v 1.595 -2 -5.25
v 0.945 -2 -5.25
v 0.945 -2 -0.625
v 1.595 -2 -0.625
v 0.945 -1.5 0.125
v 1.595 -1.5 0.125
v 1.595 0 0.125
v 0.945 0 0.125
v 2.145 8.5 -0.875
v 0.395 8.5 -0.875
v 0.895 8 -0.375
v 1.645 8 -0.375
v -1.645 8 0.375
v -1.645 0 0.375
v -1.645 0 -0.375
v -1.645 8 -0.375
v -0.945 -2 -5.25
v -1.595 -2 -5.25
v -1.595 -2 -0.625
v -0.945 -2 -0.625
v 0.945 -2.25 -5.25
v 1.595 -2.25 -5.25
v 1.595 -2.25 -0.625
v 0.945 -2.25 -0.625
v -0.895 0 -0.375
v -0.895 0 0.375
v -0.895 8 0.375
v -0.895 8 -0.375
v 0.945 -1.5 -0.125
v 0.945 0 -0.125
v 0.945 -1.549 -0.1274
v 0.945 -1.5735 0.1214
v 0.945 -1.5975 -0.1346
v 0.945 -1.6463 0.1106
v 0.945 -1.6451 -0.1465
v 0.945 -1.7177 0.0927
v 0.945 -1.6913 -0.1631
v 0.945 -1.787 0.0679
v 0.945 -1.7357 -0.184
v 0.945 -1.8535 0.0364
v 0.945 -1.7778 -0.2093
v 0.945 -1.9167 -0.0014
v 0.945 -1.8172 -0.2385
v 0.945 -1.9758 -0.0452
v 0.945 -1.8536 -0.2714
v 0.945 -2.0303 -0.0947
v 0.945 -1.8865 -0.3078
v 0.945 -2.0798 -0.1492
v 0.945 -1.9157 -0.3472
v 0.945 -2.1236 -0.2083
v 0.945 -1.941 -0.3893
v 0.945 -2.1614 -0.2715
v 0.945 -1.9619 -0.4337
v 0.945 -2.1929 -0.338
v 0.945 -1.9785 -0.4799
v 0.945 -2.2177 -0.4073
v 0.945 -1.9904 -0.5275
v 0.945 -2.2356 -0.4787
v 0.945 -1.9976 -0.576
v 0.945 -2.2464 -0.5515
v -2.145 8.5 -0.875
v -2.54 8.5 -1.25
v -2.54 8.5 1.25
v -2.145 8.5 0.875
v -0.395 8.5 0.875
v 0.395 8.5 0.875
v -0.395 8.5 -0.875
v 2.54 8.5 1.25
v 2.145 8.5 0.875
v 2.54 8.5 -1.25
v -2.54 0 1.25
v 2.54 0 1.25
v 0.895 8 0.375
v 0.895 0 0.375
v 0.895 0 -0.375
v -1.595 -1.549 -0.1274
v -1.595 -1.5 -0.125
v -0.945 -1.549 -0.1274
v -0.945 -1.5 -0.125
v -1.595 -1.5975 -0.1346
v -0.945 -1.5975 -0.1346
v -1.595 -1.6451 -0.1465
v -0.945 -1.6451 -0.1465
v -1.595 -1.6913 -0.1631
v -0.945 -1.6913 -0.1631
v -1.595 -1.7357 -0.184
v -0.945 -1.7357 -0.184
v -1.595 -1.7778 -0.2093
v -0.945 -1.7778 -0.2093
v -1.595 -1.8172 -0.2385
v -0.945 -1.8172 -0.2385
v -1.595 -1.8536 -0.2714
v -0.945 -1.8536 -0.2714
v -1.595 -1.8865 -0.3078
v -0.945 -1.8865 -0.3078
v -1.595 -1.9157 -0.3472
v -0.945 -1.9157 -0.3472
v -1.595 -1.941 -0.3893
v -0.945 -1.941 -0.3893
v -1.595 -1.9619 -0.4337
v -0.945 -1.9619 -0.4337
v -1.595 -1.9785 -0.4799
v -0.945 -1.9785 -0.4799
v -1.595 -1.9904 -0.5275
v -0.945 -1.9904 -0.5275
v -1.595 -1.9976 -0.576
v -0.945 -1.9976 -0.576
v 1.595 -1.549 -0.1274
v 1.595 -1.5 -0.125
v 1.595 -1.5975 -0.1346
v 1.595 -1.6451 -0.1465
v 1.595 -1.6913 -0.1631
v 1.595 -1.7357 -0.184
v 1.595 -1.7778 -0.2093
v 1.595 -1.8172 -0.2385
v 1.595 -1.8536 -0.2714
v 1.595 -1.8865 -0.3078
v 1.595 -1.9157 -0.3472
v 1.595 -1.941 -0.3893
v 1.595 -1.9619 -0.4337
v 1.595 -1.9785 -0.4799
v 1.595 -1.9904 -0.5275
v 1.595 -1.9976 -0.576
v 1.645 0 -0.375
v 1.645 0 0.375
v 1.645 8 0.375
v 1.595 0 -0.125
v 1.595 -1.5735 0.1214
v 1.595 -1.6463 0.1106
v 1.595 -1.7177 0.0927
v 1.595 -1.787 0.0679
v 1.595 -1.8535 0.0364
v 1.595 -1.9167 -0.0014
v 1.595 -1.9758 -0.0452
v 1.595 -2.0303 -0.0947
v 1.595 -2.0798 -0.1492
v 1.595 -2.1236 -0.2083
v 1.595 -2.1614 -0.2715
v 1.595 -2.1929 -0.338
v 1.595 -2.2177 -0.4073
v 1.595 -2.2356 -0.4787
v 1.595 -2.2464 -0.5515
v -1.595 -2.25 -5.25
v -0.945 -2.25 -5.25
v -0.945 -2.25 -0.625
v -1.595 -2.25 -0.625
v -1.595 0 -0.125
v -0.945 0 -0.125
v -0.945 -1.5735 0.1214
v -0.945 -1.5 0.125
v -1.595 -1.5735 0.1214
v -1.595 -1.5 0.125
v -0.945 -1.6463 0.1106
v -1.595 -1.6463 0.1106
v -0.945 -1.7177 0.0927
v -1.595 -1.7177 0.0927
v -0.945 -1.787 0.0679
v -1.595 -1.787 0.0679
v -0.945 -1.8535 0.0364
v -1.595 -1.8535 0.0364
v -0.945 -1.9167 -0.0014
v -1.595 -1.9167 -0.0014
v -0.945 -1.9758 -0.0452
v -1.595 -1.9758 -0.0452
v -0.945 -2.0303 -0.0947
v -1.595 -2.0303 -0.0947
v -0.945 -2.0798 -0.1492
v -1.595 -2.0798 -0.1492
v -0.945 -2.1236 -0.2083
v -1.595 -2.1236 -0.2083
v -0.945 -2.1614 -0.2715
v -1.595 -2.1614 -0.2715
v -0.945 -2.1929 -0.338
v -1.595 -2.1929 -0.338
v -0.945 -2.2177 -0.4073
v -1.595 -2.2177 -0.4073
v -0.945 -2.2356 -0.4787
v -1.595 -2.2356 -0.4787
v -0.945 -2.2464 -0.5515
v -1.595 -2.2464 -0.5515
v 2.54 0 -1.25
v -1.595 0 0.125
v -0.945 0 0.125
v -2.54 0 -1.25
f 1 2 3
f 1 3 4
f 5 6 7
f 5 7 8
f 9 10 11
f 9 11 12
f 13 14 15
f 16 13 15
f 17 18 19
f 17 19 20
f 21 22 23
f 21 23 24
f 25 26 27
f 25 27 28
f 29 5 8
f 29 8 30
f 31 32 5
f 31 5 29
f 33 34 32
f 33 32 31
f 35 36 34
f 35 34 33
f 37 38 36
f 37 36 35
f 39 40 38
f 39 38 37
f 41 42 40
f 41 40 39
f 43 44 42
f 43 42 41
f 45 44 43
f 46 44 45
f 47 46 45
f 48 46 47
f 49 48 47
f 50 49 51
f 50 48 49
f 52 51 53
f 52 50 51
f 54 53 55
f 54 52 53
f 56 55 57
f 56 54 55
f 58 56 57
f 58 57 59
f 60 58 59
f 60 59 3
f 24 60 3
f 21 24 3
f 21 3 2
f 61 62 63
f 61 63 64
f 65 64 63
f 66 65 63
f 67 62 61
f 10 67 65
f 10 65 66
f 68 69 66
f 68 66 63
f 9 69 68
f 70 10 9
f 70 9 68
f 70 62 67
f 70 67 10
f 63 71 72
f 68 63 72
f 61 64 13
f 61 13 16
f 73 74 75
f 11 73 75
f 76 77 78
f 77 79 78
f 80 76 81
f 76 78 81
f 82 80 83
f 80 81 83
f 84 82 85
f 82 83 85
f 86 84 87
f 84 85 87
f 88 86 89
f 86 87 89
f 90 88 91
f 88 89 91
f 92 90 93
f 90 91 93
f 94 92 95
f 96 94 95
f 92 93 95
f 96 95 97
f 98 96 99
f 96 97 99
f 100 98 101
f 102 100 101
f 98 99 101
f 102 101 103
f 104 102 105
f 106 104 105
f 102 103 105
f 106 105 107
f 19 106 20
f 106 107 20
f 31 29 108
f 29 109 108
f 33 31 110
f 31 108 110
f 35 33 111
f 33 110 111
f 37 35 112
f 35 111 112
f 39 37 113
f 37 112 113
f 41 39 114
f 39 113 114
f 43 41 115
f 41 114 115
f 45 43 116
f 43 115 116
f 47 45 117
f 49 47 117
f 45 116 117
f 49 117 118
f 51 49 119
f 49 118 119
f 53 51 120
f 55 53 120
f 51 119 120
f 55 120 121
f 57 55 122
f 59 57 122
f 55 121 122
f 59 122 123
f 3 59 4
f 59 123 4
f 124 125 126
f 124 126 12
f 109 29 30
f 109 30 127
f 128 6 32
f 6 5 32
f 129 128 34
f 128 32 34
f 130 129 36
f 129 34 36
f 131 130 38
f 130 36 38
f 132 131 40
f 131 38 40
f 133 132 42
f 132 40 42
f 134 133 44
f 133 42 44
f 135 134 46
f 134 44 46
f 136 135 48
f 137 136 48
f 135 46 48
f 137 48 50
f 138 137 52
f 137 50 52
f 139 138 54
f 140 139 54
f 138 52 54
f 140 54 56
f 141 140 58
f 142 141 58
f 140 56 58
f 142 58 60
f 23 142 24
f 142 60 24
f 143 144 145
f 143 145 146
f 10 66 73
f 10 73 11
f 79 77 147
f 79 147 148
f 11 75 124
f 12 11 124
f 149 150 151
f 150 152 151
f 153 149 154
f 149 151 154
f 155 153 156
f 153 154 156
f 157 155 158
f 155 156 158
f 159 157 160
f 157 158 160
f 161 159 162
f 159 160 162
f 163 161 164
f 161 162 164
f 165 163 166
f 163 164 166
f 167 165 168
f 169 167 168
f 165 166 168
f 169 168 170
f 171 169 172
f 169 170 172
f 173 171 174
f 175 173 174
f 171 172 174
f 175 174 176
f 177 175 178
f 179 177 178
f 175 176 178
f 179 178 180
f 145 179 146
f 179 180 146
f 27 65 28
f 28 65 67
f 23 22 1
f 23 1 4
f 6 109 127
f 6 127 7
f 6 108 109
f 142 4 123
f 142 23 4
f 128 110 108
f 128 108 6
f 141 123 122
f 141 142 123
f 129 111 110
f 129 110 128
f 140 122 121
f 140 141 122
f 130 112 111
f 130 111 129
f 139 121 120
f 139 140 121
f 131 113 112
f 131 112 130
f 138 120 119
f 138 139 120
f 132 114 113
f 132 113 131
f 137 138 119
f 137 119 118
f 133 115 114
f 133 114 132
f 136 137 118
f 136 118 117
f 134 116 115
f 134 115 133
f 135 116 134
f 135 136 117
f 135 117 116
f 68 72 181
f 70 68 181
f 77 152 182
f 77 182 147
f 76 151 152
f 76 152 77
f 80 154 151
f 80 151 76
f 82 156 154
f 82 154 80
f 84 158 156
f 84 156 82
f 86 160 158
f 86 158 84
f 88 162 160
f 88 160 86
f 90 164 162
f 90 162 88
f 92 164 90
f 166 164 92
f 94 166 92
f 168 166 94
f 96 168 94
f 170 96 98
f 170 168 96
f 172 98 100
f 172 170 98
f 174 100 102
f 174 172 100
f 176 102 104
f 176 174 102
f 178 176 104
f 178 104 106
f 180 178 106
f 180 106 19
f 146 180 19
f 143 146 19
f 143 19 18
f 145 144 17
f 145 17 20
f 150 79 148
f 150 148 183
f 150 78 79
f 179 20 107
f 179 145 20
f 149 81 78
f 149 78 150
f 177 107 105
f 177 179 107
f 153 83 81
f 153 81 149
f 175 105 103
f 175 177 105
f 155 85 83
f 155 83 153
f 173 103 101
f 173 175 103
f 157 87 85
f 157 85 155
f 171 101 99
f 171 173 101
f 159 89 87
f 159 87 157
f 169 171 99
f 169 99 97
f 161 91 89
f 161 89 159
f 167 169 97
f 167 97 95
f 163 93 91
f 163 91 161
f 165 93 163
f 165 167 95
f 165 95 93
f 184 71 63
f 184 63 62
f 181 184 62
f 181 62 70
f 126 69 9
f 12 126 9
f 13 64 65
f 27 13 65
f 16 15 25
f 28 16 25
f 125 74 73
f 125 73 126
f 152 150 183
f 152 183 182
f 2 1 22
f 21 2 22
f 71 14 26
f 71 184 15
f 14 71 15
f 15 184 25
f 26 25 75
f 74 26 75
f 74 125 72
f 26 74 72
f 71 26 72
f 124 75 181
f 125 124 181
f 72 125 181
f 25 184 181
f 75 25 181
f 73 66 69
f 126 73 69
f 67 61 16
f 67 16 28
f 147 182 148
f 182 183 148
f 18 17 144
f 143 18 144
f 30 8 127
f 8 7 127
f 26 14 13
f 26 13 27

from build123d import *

# Parameters (mm, degrees)
SKETCH1_W           = 5.08
SKETCH1_H           = 2.5
SKETCH1_W_2         = 0.75
SKETCH1_H_2         = 0.75
BOSS_EXTRUDE1_DEPTH = 8.5
CHAMFER1_SIZE       = 0.5
SKETCH2_W           = 0.65
SKETCH2_H           = 0.25


with BuildPart() as part:
    # Sketch1 → Boss-Extrude1 (new body)
    with BuildSketch(Plane(origin=(0, 0, 0), x_dir=(1, 0, 0), z_dir=(0, 1, 0))):
        Rectangle(SKETCH1_W, SKETCH1_H)
        with Locations((-1.27, 0)):
            Rectangle(SKETCH1_W_2, SKETCH1_H_2, mode=Mode.SUBTRACT)
        with Locations((1.27, 0)):
            Rectangle(SKETCH1_W_2, SKETCH1_H_2, mode=Mode.SUBTRACT)
    extrude(amount=BOSS_EXTRUDE1_DEPTH)

    # Chamfer1
    chamfer1_edges = [part.edges().sort_by_distance(p)[0] for p in [
        (-0.895, 8.5, 0),
        (-1.27, 8.5, -0.375),
        (-1.645, 8.5, 0),
        (-1.27, 8.5, 0.375),
        (1.645, 8.5, 0),
        (1.27, 8.5, -0.375),
        (0.895, 8.5, 0),
        (1.27, 8.5, 0.375),
    ]]
    chamfer(chamfer1_edges, length=CHAMFER1_SIZE)


with BuildPart() as body_2:
    # Sweep1: sweep along a path in Sketch3
    with BuildLine(Plane.ZY.offset(2.54)) as sweep1_path:
        Line((-0.125, 0), (-0.125, -1.5))
        ThreePointArc((-0.125, -1.5), (-0.271446609, -1.853553391), (-0.625, -2))
        Line((-0.625, -2), (-5.25, -2))
    # Sketch2 → Sweep1 (sweep)
    with BuildSketch(Plane.XZ):
        with Locations((-1.27, 0)):
            Rectangle(SKETCH2_W, SKETCH2_H)
        with Locations((1.27, 0)):
            Rectangle(SKETCH2_W, SKETCH2_H)
    sweep(path=sweep1_path.line)


solid = Compound([part.part, body_2.part])
